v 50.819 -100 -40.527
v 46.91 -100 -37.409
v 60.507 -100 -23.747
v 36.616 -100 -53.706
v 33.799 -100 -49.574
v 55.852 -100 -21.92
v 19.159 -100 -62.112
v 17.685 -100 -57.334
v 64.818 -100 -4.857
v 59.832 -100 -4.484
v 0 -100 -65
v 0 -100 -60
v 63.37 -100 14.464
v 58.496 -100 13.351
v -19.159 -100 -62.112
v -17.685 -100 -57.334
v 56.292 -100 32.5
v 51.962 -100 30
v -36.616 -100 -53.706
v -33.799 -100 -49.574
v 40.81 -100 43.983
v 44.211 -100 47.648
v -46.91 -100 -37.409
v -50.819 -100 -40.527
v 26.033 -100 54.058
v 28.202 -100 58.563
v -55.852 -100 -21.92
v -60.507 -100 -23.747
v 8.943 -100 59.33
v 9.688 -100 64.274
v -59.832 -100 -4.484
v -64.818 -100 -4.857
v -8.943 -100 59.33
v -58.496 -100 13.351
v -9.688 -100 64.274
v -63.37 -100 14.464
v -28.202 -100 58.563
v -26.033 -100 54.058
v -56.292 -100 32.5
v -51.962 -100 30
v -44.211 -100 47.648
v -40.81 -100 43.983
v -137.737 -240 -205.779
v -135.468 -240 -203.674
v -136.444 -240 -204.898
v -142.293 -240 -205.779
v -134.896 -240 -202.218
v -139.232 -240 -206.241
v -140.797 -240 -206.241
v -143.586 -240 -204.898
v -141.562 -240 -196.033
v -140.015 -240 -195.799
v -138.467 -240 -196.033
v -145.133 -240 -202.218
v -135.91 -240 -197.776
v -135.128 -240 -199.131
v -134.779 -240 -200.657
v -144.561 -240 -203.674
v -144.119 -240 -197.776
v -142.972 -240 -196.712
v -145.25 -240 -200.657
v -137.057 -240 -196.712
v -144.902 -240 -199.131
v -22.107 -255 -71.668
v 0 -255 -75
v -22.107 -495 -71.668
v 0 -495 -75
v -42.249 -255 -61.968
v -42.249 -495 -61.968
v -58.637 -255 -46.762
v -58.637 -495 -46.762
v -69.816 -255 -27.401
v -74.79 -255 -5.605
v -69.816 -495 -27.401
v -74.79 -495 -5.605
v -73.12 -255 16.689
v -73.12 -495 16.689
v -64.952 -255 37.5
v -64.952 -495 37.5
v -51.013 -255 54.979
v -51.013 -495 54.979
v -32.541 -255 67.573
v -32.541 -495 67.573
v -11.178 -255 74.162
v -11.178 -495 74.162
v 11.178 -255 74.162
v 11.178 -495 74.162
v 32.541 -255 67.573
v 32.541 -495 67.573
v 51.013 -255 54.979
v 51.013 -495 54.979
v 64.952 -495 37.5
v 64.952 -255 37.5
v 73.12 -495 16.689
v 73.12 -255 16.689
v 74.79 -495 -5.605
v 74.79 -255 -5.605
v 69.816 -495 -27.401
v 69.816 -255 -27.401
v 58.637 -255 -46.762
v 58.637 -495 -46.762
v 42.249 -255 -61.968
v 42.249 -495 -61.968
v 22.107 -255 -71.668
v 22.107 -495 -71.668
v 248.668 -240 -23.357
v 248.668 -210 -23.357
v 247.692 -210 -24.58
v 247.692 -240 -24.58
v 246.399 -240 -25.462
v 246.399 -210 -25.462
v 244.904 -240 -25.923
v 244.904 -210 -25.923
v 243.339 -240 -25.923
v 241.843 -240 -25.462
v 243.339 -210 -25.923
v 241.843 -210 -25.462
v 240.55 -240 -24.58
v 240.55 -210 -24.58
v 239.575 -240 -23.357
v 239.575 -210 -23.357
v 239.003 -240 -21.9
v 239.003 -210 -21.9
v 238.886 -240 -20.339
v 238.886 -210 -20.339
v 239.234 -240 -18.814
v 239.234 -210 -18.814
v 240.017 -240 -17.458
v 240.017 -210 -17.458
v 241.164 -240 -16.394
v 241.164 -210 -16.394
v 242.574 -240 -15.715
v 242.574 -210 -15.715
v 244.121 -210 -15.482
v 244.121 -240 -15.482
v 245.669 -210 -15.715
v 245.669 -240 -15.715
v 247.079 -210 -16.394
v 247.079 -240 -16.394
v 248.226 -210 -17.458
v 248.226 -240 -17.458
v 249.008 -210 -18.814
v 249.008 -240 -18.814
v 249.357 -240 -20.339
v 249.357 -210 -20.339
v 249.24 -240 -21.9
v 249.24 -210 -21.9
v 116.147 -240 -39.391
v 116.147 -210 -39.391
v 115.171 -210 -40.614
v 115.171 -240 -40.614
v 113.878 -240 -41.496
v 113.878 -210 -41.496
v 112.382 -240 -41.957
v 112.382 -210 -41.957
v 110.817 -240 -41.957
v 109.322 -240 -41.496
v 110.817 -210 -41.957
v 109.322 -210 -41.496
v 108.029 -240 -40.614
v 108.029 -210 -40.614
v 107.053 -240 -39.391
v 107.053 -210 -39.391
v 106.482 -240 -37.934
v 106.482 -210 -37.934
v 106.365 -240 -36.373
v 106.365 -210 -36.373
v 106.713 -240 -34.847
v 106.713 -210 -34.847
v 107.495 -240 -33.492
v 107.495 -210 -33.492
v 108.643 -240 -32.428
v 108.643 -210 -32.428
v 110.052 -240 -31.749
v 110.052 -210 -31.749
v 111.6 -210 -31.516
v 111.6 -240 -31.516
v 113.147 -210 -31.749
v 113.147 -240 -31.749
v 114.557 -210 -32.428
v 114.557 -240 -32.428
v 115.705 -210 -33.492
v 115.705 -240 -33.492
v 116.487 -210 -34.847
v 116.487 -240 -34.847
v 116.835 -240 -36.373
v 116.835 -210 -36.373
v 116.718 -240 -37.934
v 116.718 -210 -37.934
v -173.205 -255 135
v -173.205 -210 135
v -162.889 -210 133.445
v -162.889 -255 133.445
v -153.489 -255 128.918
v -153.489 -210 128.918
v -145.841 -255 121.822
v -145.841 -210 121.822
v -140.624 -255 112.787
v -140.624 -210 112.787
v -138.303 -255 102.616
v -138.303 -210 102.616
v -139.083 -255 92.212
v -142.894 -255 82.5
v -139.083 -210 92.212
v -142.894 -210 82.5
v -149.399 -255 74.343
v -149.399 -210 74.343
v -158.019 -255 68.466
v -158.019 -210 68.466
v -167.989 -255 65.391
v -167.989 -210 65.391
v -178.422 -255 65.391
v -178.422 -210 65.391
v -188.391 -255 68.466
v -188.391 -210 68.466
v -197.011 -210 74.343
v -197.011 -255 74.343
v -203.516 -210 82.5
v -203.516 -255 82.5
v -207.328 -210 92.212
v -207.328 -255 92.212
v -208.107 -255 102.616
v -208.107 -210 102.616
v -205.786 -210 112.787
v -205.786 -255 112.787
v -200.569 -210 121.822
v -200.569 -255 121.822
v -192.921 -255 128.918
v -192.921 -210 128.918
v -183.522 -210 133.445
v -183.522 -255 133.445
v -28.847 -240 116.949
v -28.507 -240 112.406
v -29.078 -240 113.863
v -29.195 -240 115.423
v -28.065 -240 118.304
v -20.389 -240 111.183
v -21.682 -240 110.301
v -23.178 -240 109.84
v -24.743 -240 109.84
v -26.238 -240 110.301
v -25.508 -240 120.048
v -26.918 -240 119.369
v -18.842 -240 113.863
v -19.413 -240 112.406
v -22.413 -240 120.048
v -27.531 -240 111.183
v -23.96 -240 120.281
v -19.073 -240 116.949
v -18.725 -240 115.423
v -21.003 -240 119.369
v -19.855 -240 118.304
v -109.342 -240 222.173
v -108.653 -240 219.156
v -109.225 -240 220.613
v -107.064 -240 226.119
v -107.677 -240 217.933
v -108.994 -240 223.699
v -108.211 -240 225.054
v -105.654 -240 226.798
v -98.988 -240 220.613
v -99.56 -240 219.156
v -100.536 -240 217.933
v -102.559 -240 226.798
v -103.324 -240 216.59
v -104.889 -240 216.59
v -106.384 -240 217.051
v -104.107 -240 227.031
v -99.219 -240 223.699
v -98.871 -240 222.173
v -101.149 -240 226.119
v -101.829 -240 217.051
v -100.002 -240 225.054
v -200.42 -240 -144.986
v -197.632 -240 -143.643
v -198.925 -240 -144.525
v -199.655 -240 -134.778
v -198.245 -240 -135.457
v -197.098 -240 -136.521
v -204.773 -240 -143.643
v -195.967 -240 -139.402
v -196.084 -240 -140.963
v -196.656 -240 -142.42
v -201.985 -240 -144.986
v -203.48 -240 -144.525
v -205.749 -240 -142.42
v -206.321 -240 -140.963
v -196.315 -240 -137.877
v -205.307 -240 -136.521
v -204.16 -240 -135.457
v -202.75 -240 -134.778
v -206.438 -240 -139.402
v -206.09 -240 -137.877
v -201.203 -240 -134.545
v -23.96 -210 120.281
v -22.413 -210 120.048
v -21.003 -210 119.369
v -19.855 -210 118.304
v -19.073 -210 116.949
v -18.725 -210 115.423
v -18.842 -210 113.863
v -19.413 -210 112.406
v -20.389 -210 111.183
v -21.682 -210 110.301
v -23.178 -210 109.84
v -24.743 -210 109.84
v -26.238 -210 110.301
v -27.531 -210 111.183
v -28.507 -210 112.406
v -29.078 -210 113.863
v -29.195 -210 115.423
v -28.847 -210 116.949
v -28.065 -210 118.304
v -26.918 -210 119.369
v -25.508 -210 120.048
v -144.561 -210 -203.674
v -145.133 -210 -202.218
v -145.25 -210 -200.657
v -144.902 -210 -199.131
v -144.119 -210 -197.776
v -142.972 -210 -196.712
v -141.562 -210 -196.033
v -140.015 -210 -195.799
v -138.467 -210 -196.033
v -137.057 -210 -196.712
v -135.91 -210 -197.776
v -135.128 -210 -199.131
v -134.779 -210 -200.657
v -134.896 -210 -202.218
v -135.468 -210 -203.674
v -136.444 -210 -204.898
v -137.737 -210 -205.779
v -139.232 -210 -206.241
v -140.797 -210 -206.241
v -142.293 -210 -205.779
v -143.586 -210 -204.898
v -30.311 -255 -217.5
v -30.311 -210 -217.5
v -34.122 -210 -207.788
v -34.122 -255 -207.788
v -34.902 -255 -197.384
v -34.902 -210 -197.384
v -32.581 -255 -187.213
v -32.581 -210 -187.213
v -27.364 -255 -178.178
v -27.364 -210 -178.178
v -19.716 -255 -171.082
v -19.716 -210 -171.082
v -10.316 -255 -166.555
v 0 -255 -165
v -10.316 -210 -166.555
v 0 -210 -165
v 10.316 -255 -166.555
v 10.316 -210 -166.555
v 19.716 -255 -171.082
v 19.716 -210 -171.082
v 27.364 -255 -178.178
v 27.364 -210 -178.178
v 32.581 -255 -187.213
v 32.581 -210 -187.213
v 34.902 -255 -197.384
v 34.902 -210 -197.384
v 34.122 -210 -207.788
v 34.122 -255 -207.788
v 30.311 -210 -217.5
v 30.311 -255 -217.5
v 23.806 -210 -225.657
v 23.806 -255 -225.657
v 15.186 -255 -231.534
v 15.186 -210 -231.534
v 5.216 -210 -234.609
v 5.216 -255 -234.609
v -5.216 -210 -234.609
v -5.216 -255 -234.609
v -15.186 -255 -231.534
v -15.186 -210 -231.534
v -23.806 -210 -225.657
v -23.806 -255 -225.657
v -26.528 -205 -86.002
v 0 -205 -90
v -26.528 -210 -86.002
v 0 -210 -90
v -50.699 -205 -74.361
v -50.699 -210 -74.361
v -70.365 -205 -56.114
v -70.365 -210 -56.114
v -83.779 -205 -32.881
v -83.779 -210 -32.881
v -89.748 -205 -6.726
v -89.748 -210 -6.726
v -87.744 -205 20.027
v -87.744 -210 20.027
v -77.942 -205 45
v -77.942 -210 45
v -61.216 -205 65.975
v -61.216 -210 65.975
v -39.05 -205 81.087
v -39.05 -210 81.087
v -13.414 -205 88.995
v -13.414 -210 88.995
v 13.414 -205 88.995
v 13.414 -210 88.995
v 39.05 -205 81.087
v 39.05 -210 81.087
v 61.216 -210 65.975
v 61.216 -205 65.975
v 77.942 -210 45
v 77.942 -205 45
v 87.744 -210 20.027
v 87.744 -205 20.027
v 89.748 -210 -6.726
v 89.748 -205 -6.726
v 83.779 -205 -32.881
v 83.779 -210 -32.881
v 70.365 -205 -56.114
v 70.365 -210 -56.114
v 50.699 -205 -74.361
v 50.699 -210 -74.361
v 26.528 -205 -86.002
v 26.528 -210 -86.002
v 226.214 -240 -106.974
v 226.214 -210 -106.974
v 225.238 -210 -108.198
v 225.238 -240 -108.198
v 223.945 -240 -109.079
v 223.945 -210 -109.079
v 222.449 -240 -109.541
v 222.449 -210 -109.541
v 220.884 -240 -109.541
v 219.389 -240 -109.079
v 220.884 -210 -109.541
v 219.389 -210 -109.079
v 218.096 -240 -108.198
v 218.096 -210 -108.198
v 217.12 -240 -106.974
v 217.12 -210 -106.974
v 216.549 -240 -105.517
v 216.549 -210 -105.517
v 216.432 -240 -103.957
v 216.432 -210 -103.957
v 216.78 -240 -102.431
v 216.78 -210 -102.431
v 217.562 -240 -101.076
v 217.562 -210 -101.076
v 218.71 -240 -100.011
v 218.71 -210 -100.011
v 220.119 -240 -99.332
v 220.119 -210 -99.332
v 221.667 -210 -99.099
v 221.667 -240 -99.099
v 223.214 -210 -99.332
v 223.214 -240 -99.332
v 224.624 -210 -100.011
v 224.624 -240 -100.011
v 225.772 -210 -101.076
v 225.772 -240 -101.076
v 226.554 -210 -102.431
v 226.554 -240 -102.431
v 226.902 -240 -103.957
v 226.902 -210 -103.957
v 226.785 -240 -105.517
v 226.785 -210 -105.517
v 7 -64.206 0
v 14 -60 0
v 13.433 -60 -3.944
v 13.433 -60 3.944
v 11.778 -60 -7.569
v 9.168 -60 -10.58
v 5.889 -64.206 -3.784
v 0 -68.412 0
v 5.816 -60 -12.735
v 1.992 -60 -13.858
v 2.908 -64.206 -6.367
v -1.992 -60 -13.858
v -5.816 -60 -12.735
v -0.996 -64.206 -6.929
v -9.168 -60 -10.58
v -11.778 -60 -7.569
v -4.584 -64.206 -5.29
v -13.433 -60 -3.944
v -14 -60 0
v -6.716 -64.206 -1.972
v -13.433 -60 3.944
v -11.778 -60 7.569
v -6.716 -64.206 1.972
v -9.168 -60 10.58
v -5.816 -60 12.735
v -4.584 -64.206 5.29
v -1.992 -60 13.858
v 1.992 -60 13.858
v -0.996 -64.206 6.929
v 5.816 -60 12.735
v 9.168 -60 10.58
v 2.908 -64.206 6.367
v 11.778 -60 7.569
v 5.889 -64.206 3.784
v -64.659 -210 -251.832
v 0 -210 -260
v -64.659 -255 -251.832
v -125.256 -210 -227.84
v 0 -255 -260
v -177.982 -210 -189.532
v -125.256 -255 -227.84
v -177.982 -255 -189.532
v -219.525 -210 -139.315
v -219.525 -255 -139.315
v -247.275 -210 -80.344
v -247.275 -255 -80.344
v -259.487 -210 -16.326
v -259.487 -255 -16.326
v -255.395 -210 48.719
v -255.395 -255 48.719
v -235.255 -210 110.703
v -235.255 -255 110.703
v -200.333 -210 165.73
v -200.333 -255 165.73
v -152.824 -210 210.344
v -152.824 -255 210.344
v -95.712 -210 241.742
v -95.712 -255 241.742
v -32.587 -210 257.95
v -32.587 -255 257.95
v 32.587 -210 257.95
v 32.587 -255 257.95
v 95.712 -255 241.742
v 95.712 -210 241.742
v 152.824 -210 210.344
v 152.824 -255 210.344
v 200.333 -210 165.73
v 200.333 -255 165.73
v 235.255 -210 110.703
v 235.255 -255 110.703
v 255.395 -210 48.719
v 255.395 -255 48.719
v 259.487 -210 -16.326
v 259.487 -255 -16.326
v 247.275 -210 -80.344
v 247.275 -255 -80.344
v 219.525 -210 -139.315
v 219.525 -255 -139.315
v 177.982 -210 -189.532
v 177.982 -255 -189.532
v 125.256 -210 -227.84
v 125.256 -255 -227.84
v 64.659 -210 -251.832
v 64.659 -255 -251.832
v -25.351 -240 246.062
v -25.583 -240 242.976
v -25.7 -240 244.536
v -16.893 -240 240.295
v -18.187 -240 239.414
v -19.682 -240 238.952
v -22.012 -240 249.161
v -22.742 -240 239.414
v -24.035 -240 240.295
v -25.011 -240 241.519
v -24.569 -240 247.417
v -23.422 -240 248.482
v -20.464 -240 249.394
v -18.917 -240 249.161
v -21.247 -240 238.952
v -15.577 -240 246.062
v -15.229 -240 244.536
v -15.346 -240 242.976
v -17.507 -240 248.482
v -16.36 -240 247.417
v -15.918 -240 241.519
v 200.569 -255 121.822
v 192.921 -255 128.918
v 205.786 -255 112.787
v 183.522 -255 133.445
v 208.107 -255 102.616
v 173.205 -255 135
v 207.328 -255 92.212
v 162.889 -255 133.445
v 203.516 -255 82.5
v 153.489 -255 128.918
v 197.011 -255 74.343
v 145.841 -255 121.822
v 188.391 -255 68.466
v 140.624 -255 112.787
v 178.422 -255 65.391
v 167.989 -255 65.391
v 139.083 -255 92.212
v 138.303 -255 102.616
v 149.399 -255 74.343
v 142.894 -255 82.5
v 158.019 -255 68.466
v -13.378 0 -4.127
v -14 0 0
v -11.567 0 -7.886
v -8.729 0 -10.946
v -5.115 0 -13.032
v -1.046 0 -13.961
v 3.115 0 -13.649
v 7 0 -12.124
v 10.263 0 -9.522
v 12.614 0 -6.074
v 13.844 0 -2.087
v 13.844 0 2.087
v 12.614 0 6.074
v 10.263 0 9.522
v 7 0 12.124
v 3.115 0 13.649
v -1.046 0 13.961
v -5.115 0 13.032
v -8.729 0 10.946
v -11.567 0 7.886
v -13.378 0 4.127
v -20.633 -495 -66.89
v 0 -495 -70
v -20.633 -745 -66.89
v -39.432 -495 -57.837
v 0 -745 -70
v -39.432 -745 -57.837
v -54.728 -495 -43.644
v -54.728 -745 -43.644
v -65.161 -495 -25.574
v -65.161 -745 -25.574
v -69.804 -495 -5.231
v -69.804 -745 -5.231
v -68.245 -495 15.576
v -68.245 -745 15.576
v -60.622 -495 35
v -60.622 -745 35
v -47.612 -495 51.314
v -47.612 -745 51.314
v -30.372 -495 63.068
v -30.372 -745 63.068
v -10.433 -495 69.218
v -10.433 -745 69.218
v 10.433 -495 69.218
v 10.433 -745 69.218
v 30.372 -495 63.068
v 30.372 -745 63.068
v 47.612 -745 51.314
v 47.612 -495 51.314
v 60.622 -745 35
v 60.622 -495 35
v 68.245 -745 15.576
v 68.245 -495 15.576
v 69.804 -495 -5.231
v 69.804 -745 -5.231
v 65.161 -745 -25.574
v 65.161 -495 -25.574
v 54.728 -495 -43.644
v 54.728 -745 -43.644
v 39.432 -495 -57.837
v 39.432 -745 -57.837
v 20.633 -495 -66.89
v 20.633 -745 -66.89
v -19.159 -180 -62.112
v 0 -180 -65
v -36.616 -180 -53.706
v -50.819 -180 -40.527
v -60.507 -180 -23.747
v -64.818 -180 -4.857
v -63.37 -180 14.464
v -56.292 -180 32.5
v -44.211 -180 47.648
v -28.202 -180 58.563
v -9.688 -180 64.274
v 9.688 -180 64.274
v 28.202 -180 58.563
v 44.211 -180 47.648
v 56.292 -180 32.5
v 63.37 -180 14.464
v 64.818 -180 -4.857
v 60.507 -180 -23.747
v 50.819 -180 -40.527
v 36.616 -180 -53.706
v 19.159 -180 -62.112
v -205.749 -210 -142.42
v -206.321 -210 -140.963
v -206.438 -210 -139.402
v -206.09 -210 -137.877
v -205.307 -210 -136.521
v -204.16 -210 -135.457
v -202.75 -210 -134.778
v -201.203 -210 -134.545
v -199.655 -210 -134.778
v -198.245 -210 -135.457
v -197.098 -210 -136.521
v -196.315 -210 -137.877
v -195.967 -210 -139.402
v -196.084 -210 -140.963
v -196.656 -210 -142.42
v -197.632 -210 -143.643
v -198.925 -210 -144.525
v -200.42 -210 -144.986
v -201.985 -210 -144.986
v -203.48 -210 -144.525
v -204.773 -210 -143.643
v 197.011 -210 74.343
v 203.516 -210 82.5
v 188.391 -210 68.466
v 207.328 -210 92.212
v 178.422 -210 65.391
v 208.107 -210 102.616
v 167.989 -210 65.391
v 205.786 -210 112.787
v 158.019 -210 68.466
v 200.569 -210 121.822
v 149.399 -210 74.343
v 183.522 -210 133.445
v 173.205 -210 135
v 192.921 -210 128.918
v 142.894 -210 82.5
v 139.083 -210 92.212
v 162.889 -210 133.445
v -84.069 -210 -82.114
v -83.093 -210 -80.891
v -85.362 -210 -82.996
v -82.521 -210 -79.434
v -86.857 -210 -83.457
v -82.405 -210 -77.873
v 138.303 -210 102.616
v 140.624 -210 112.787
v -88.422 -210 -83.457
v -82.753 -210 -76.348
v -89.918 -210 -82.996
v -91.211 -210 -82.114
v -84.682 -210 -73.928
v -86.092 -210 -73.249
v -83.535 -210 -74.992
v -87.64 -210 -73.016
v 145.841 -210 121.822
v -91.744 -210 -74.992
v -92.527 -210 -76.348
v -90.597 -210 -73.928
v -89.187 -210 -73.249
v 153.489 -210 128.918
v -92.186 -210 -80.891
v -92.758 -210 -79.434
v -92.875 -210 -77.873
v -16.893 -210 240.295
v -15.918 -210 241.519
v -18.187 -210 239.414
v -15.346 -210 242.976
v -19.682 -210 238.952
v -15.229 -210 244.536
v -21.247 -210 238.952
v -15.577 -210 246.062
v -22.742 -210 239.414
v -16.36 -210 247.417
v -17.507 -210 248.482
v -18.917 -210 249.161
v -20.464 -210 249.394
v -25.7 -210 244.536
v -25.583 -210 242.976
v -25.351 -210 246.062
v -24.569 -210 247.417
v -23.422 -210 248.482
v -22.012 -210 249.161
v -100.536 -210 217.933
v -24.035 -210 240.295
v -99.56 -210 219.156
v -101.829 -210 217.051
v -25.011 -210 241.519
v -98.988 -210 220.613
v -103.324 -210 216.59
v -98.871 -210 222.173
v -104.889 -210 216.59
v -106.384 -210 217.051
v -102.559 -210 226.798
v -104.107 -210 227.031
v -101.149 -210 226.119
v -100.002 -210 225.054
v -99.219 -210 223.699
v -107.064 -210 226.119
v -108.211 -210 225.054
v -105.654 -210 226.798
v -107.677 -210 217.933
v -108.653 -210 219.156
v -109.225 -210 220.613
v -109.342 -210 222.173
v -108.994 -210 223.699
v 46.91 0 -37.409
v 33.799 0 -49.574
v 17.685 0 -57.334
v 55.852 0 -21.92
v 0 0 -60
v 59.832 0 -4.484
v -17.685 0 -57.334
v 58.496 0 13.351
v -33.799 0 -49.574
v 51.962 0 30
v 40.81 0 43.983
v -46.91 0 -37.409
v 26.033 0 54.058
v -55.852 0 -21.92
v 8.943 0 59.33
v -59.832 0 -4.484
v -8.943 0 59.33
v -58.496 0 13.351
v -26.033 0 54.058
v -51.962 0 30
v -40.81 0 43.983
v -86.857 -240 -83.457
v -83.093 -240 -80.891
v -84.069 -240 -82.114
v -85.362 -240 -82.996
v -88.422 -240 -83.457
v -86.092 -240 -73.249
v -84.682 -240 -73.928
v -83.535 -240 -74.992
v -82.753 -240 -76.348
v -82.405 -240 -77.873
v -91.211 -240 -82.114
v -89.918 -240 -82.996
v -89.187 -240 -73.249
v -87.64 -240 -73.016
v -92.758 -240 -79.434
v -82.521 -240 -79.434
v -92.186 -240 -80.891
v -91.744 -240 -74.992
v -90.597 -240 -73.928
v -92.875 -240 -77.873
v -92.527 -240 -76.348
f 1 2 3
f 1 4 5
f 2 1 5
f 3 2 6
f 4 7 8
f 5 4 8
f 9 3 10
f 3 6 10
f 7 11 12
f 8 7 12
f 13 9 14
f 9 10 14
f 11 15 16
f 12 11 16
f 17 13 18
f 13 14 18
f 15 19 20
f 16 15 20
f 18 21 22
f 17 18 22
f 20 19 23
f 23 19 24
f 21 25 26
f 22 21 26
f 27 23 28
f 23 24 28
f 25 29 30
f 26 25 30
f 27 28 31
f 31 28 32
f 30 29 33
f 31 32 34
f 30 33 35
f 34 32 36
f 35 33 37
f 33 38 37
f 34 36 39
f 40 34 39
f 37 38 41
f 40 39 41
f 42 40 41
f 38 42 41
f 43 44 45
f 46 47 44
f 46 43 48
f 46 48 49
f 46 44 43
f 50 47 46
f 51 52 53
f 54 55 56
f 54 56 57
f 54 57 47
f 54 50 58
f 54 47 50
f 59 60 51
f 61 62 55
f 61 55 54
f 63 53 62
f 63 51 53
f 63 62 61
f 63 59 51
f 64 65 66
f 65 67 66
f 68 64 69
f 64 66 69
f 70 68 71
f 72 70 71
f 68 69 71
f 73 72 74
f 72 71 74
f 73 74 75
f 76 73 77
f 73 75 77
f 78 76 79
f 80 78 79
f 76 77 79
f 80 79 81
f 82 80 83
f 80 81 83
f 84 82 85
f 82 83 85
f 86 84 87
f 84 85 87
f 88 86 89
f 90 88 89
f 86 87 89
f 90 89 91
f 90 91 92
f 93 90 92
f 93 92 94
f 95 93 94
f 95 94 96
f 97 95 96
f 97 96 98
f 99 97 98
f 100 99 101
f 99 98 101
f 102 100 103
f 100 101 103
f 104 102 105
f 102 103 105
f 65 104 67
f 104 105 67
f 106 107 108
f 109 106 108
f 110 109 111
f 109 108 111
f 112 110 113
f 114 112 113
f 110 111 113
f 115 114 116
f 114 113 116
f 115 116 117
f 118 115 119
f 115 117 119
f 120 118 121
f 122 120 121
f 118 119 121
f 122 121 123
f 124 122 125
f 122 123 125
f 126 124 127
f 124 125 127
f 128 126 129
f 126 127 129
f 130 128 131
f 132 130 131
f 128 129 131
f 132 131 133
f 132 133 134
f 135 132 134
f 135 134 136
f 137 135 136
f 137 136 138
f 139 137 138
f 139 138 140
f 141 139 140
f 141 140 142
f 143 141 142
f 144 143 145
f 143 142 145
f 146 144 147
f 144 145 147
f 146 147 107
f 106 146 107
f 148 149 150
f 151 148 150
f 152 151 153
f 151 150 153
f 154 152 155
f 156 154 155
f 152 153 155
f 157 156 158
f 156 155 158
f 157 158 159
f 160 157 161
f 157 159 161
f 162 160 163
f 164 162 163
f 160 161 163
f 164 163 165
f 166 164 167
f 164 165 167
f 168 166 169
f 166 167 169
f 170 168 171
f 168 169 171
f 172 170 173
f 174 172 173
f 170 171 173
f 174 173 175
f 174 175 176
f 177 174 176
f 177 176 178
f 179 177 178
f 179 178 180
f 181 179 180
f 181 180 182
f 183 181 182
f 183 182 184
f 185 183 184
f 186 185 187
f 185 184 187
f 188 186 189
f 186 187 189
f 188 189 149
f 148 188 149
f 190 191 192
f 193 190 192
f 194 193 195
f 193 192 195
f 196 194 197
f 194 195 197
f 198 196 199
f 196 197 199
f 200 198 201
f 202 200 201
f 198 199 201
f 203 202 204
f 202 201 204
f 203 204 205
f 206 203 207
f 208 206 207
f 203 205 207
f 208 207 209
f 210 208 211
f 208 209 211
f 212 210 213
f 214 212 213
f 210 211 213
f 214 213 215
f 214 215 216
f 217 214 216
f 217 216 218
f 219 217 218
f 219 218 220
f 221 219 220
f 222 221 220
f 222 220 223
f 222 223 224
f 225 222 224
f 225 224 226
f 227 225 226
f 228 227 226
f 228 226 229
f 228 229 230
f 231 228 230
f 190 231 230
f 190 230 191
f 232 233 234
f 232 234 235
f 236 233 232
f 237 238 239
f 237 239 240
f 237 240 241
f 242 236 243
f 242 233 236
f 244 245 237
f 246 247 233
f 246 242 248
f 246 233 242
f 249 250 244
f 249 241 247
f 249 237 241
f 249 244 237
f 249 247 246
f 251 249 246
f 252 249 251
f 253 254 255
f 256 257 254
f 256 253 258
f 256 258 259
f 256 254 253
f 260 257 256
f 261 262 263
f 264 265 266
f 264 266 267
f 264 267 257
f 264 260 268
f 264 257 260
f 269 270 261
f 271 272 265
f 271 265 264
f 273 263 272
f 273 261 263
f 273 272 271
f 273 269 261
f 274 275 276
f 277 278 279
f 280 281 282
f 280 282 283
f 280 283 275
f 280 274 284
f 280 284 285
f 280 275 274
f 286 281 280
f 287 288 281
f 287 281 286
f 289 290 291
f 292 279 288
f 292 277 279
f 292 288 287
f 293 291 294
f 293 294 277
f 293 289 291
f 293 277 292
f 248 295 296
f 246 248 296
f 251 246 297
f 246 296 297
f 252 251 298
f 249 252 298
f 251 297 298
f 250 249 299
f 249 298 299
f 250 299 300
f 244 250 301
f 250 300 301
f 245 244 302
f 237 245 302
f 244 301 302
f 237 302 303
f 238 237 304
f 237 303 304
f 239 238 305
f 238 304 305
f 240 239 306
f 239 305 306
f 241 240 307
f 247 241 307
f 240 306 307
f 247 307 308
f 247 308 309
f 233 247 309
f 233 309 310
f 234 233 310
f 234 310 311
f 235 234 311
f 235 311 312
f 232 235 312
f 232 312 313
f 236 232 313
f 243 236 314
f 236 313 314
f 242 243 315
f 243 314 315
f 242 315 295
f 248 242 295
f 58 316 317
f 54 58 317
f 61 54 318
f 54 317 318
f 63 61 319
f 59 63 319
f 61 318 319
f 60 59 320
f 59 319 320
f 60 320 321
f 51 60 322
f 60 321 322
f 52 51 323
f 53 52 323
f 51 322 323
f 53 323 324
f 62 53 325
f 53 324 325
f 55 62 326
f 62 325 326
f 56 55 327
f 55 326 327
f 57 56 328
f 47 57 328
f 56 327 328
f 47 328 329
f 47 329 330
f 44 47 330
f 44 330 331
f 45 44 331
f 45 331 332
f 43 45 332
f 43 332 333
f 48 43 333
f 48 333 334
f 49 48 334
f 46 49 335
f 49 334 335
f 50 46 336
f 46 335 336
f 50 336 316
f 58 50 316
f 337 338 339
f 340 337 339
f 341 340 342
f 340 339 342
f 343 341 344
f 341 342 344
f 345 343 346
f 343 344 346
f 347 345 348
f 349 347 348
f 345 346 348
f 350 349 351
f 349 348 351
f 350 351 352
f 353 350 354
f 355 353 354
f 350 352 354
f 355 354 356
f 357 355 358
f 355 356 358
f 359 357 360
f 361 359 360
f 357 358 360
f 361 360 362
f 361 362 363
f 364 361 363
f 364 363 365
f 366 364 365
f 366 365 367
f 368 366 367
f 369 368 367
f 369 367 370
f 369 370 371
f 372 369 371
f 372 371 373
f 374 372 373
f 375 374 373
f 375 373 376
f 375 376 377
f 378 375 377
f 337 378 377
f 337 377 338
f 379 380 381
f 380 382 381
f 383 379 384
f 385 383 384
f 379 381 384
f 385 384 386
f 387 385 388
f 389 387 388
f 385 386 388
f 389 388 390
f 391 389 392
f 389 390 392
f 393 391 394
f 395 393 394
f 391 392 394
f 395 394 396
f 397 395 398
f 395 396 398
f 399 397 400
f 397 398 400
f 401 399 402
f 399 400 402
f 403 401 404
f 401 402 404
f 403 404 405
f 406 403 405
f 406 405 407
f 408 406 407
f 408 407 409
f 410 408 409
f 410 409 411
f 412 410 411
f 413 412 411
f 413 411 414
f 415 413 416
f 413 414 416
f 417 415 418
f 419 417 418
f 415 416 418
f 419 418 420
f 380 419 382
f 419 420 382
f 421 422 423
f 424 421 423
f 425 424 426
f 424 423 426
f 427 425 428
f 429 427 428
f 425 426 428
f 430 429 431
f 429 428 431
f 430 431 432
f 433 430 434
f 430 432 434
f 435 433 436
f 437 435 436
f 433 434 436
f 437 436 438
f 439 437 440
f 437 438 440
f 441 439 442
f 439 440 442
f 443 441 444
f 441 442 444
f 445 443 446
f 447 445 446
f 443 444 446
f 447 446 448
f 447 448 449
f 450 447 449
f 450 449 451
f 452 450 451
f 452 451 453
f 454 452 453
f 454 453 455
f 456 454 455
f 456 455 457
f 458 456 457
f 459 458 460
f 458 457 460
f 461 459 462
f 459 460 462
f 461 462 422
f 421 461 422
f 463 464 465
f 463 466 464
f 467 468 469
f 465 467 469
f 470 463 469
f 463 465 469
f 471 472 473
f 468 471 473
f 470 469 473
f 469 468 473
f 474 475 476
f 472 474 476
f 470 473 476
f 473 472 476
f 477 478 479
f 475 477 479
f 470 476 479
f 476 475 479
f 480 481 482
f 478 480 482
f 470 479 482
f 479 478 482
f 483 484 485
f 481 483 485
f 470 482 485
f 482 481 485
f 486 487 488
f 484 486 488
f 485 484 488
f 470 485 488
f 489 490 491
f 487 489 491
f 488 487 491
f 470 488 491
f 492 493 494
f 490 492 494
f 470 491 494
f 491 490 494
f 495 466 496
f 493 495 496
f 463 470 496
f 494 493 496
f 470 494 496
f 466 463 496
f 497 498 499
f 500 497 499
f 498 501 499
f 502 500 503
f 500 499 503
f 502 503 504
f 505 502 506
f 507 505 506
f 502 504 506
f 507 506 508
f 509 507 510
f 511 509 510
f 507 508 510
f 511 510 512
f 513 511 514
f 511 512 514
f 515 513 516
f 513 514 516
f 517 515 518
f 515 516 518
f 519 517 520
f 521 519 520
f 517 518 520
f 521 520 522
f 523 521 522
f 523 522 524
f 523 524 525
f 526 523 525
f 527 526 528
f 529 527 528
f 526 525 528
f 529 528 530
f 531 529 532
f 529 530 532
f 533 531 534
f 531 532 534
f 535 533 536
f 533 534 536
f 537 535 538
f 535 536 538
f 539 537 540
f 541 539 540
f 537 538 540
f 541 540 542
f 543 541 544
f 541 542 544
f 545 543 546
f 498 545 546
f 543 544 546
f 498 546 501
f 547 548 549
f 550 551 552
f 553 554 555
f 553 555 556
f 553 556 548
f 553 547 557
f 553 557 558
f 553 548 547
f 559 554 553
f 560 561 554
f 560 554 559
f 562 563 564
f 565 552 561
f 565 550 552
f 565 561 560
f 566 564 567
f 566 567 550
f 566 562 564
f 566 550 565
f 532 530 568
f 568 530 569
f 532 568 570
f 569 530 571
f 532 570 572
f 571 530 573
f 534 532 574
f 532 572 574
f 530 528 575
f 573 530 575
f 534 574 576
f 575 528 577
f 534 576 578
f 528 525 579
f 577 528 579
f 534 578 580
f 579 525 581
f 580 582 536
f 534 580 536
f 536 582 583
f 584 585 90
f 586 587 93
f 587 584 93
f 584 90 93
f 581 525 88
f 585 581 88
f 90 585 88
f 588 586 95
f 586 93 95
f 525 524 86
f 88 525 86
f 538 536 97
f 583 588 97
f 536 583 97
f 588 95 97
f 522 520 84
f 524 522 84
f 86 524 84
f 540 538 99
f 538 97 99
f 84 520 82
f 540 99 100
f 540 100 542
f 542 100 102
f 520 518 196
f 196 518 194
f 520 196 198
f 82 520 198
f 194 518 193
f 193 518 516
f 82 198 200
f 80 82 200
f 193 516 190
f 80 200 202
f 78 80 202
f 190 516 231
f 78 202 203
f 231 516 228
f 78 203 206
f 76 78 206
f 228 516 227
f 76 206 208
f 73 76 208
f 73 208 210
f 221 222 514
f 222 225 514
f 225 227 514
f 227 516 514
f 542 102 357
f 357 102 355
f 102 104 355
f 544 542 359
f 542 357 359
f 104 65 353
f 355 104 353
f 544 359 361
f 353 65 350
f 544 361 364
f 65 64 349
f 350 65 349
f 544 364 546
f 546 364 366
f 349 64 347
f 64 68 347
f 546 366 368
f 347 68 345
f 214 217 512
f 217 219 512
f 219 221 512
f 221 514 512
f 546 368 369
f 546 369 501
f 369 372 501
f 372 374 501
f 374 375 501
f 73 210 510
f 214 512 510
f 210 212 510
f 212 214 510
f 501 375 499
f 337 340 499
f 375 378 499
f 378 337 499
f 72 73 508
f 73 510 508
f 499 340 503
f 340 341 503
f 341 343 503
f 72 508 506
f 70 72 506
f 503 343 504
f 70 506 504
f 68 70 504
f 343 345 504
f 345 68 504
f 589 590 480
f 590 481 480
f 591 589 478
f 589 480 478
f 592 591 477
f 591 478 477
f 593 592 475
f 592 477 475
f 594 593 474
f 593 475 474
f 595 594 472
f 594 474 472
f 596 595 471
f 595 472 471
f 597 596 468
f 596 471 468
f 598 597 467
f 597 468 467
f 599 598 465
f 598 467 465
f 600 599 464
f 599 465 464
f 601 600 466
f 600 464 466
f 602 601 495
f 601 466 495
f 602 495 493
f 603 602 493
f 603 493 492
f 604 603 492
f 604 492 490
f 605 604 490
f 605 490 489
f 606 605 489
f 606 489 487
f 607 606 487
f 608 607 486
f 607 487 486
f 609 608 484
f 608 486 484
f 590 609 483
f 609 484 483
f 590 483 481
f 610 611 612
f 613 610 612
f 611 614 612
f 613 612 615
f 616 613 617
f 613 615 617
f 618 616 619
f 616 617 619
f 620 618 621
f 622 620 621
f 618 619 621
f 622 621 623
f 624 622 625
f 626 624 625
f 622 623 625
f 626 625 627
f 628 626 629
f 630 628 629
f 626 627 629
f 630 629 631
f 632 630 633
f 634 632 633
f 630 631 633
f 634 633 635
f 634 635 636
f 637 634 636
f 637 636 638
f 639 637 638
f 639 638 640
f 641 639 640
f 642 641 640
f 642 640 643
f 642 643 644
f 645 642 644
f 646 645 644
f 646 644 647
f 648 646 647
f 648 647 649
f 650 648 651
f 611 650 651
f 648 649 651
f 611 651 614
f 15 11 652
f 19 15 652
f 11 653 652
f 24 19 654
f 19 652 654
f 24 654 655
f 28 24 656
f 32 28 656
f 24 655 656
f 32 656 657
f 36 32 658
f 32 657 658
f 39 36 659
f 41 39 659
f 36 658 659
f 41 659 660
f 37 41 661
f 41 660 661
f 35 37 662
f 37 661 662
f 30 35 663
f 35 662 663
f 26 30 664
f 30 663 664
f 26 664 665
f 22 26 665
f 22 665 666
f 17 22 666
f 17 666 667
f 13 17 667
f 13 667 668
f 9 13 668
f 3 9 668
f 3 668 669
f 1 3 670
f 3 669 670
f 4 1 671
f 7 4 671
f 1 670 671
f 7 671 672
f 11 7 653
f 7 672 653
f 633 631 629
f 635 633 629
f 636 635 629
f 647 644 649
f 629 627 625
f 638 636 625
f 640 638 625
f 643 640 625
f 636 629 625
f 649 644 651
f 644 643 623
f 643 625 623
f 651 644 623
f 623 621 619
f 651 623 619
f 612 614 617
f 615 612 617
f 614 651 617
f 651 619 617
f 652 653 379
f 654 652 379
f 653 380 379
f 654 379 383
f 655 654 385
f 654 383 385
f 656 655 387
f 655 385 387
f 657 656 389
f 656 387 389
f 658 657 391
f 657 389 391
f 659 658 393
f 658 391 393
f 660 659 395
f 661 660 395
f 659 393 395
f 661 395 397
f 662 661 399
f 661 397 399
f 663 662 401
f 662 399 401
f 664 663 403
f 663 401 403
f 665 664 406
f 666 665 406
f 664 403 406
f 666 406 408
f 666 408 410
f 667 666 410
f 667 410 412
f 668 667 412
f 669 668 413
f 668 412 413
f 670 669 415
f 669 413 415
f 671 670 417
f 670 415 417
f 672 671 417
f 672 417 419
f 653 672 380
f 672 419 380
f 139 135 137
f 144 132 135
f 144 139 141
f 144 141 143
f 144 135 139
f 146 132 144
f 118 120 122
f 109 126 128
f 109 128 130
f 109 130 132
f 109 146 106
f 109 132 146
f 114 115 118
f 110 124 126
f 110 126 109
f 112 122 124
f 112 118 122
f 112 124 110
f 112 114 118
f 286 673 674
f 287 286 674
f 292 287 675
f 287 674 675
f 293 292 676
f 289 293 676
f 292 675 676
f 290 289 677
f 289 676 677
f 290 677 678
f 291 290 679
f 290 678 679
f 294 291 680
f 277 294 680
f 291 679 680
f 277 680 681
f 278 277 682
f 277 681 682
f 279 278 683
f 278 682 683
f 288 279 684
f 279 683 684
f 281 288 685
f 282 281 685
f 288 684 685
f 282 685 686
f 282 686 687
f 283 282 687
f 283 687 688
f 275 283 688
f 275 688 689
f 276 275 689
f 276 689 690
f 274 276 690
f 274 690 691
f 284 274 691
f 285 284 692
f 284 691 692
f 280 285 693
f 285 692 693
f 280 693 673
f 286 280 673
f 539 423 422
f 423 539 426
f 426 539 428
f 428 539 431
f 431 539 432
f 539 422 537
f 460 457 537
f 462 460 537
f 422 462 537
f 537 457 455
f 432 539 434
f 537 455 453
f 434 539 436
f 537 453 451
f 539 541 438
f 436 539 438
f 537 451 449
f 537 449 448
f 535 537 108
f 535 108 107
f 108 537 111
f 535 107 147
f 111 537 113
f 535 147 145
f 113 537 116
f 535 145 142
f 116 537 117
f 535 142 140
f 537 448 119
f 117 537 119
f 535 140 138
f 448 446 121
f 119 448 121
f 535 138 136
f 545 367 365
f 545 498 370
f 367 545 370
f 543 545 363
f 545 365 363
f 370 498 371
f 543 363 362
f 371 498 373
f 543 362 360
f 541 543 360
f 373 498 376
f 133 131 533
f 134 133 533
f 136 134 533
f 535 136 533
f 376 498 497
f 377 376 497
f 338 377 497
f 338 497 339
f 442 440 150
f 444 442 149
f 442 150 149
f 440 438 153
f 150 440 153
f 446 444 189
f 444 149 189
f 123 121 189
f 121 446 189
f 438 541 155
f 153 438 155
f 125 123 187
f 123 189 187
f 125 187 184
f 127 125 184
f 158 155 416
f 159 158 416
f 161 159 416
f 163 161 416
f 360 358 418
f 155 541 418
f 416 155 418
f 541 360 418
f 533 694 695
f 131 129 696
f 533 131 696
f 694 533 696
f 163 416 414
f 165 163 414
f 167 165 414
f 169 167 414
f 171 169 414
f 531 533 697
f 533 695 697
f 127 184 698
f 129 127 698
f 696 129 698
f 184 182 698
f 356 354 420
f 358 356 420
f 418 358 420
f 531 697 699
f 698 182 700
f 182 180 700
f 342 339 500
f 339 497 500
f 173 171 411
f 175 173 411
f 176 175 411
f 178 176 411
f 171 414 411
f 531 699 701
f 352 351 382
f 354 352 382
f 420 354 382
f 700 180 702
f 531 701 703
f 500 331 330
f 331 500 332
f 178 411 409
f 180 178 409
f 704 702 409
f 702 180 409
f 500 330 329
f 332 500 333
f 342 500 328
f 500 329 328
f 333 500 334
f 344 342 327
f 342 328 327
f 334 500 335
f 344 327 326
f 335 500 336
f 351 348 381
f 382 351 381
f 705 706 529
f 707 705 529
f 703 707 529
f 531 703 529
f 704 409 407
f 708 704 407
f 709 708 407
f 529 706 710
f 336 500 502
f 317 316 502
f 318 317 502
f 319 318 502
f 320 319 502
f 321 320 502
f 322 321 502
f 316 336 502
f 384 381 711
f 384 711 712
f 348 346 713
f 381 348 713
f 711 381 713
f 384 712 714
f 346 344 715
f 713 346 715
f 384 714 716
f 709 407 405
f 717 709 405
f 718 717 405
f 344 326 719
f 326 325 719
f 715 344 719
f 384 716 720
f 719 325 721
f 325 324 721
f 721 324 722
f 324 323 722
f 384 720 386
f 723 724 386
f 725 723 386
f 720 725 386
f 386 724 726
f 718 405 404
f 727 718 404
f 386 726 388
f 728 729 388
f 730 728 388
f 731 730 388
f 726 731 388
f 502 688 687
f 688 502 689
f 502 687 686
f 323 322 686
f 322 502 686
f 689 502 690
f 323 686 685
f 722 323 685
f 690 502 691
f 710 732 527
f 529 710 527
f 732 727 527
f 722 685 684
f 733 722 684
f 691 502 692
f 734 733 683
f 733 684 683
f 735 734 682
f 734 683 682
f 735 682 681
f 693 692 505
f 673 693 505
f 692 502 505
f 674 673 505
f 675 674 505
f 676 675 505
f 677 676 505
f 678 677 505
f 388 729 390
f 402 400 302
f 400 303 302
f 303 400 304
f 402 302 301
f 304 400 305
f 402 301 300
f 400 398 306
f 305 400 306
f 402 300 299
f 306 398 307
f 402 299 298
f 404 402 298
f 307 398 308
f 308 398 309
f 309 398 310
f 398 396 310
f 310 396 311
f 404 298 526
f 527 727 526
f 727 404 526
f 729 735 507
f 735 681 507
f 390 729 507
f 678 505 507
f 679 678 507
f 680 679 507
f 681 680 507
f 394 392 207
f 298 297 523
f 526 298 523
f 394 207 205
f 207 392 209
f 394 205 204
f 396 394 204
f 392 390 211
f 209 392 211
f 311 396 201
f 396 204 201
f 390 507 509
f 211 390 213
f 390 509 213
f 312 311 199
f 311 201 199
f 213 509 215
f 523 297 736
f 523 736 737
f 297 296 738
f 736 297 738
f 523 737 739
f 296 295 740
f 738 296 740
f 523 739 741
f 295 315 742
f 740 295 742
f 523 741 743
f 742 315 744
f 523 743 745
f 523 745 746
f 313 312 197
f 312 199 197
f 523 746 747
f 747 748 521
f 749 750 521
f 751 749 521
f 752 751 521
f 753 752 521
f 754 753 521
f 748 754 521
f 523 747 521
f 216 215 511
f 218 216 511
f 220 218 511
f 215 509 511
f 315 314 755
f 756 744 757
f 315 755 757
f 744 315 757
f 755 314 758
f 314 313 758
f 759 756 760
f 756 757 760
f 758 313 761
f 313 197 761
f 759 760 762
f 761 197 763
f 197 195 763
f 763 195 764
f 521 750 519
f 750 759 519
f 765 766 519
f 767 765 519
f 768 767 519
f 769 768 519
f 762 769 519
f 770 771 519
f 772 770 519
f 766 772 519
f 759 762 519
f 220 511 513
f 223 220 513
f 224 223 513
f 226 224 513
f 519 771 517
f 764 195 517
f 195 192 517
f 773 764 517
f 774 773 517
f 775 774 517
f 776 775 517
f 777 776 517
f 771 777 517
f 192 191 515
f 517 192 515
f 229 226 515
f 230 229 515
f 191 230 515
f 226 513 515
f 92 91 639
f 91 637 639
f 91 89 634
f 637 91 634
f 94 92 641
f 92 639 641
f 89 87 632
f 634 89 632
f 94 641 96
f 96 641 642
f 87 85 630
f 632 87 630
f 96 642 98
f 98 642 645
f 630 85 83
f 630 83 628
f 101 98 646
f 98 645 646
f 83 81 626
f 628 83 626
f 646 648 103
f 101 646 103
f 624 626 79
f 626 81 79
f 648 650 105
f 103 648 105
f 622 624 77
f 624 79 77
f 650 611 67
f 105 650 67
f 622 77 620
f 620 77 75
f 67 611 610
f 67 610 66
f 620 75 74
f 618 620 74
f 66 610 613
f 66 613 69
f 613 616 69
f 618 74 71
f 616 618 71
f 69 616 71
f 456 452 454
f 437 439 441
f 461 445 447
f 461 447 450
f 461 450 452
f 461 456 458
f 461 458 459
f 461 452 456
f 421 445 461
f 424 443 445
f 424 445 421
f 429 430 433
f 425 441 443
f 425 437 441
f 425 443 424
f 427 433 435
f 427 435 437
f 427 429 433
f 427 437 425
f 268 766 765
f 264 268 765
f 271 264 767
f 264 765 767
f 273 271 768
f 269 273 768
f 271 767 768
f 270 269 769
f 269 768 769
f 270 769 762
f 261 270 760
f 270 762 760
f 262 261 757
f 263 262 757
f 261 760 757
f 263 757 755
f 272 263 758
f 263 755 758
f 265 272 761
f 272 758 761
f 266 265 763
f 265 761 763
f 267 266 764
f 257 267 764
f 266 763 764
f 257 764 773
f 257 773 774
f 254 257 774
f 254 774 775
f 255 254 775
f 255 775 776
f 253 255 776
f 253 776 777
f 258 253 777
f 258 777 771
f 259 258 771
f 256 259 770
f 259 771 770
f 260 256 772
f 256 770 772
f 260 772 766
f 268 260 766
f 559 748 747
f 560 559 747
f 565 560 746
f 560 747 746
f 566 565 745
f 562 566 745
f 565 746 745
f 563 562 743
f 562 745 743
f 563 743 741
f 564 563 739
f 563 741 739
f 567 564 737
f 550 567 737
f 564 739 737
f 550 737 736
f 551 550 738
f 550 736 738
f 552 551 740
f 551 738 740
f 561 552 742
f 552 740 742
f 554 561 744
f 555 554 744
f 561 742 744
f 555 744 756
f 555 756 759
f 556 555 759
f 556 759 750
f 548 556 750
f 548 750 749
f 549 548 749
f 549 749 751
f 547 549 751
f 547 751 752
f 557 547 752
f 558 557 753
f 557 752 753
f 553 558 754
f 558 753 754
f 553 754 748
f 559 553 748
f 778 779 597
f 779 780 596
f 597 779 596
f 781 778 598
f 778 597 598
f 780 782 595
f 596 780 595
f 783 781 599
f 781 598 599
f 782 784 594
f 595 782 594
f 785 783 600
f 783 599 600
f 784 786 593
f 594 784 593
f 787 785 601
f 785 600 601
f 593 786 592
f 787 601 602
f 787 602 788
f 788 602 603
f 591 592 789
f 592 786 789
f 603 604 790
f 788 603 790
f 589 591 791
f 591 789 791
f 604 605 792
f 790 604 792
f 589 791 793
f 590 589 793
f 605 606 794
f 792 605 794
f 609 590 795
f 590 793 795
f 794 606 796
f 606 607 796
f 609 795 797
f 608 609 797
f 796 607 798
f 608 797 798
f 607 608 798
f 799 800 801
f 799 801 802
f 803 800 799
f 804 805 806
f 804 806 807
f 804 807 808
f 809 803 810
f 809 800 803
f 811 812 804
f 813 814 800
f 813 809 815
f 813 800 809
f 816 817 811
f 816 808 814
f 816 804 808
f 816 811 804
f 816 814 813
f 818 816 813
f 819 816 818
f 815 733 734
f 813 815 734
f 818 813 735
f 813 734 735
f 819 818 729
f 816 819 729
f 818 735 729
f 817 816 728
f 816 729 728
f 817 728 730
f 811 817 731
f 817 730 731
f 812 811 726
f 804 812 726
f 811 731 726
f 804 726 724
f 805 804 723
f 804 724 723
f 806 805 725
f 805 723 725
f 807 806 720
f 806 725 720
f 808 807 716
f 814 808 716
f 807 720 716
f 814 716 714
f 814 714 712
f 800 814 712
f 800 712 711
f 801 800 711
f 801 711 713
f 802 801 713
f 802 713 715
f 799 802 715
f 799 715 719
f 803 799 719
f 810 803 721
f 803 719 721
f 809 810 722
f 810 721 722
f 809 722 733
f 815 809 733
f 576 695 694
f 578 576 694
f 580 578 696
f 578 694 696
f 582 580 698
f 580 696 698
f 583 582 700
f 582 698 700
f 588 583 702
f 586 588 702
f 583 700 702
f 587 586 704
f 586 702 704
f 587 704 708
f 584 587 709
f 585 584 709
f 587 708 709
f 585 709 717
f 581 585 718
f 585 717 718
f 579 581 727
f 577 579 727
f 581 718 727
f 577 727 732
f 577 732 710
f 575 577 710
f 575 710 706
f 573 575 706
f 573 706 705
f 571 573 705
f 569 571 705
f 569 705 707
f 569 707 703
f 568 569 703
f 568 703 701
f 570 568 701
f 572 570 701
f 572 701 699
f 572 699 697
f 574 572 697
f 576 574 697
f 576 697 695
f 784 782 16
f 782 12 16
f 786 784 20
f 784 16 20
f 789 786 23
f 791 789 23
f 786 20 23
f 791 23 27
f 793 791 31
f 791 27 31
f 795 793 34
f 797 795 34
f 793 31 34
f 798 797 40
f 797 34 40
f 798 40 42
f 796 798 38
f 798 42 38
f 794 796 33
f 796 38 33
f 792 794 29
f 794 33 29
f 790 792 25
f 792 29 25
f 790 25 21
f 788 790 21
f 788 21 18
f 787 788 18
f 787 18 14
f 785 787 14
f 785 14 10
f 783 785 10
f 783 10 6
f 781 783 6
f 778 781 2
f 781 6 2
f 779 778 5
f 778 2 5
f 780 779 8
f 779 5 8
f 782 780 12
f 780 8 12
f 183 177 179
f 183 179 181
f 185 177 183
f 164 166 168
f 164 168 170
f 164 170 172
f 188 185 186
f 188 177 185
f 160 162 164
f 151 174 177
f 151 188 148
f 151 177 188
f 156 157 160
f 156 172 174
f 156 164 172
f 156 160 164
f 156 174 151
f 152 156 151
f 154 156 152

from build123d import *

# Parameters (mm, degrees)
M30X2_0_1_D              = 28
M30X2_0_1_DEPTH          = 60
M30X2_0_1_TIP            = 8.412048666
CUT_EXTRUDE_1_REACH      = 651.173
SKETCH_4_R               = 35
PATTERN_CIRCULAR_1_COUNT = 3
SKETCH_5_R               = 5.25
CUT_EXTRUDE_2_DEPTH      = 30
PATTERN_CIRCULAR_2_COUNT = 3


with BuildPart() as part:
    # 草图1 → 旋转1 (revolve)
    with BuildSketch(Plane.XY, mode=Mode.PRIVATE) as revolve_1_sk:
        Polygon((0, 0), (-60, 0), (-60, -100), (-65, -100), (-65, -180), (-90, -205), (-90, -210), (-260, -210), (-260, -255), (-75, -255), (-75, -495), (-70, -495), (-70, -745), (0, -745), align=None)
    revolve(revolve_1_sk.sketch.rotate(Axis((0, -745, 0), (0, 1, 0)), 270), axis=Axis((0, -745, 0), (0, 1, 0)))

    # M30x2.0 螺纹孔1
    with Locations(Plane(origin=(0, 0, 0), x_dir=(1, 0, 0), z_dir=(0, 1, 0))):
        with Locations((0, 0)):
            Hole(M30X2_0_1_D / 2, depth=M30X2_0_1_DEPTH)
            with Locations((0, 0, -(M30X2_0_1_DEPTH + M30X2_0_1_TIP / 2))):  # 118° drill point
                Cone(0, M30X2_0_1_D / 2, M30X2_0_1_TIP, mode=Mode.SUBTRACT)

    # 草图4 → 切除-拉伸1 (cut, up to next)
    with BuildSketch(Plane(origin=(0, -210, 0), x_dir=(1, 0, 0), z_dir=(0, 1, 0)), mode=Mode.PRIVATE) as cut_extrude_1_sk1:
        with Locations(Location((-173.205080757, -100, 0), (0, 0, 270))):
            Circle(SKETCH_4_R)
    cut_extrude_1_tool1 = extrude(cut_extrude_1_sk1.sketch, amount=-CUT_EXTRUDE_1_REACH, mode=Mode.PRIVATE) & part.part
    cut_extrude_1 = cut_extrude_1_tool1.solids().sort_by_distance((-173.205081, -210, 100))[0]
    add(cut_extrude_1, mode=Mode.SUBTRACT)

    # 阵列(圆周)1: 切除-拉伸1 ×3 about axis
    pattern_circular_1_axis = Axis((0, 0, 0), (0, 1, 0))
    for i in range(1, PATTERN_CIRCULAR_1_COUNT):
        add(cut_extrude_1.rotate(pattern_circular_1_axis, i * 360 / PATTERN_CIRCULAR_1_COUNT), mode=Mode.SUBTRACT)

    # 草图5 → 切除-拉伸2 (cut)
    with BuildSketch(Plane(origin=(0, -210, 0), x_dir=(1, 0, 0), z_dir=(0, 1, 0))):
        with Locations(Location((-23.960098386, -115.031142241, 0), (0, 0, 270))):
            Circle(SKETCH_5_R)
        with Locations(Location((-104.106501212, -221.781055109, 0), (0, 0, 270))):
            Circle(SKETCH_5_R)
        with Locations(Location((-20.464389875, -244.143827993, 0), (0, 0, 270))):
            Circle(SKETCH_5_R)
    cut_extrude_2 = extrude(amount=-CUT_EXTRUDE_2_DEPTH, mode=Mode.SUBTRACT)

    # 阵列(圆周)2: 切除-拉伸2 ×3 about axis
    pattern_circular_2_axis = Axis((0, 0, 0), (0, 1, 0))
    for i in range(1, PATTERN_CIRCULAR_2_COUNT):
        add(cut_extrude_2.rotate(pattern_circular_2_axis, i * 360 / PATTERN_CIRCULAR_2_COUNT), mode=Mode.SUBTRACT)


solid = part.part
